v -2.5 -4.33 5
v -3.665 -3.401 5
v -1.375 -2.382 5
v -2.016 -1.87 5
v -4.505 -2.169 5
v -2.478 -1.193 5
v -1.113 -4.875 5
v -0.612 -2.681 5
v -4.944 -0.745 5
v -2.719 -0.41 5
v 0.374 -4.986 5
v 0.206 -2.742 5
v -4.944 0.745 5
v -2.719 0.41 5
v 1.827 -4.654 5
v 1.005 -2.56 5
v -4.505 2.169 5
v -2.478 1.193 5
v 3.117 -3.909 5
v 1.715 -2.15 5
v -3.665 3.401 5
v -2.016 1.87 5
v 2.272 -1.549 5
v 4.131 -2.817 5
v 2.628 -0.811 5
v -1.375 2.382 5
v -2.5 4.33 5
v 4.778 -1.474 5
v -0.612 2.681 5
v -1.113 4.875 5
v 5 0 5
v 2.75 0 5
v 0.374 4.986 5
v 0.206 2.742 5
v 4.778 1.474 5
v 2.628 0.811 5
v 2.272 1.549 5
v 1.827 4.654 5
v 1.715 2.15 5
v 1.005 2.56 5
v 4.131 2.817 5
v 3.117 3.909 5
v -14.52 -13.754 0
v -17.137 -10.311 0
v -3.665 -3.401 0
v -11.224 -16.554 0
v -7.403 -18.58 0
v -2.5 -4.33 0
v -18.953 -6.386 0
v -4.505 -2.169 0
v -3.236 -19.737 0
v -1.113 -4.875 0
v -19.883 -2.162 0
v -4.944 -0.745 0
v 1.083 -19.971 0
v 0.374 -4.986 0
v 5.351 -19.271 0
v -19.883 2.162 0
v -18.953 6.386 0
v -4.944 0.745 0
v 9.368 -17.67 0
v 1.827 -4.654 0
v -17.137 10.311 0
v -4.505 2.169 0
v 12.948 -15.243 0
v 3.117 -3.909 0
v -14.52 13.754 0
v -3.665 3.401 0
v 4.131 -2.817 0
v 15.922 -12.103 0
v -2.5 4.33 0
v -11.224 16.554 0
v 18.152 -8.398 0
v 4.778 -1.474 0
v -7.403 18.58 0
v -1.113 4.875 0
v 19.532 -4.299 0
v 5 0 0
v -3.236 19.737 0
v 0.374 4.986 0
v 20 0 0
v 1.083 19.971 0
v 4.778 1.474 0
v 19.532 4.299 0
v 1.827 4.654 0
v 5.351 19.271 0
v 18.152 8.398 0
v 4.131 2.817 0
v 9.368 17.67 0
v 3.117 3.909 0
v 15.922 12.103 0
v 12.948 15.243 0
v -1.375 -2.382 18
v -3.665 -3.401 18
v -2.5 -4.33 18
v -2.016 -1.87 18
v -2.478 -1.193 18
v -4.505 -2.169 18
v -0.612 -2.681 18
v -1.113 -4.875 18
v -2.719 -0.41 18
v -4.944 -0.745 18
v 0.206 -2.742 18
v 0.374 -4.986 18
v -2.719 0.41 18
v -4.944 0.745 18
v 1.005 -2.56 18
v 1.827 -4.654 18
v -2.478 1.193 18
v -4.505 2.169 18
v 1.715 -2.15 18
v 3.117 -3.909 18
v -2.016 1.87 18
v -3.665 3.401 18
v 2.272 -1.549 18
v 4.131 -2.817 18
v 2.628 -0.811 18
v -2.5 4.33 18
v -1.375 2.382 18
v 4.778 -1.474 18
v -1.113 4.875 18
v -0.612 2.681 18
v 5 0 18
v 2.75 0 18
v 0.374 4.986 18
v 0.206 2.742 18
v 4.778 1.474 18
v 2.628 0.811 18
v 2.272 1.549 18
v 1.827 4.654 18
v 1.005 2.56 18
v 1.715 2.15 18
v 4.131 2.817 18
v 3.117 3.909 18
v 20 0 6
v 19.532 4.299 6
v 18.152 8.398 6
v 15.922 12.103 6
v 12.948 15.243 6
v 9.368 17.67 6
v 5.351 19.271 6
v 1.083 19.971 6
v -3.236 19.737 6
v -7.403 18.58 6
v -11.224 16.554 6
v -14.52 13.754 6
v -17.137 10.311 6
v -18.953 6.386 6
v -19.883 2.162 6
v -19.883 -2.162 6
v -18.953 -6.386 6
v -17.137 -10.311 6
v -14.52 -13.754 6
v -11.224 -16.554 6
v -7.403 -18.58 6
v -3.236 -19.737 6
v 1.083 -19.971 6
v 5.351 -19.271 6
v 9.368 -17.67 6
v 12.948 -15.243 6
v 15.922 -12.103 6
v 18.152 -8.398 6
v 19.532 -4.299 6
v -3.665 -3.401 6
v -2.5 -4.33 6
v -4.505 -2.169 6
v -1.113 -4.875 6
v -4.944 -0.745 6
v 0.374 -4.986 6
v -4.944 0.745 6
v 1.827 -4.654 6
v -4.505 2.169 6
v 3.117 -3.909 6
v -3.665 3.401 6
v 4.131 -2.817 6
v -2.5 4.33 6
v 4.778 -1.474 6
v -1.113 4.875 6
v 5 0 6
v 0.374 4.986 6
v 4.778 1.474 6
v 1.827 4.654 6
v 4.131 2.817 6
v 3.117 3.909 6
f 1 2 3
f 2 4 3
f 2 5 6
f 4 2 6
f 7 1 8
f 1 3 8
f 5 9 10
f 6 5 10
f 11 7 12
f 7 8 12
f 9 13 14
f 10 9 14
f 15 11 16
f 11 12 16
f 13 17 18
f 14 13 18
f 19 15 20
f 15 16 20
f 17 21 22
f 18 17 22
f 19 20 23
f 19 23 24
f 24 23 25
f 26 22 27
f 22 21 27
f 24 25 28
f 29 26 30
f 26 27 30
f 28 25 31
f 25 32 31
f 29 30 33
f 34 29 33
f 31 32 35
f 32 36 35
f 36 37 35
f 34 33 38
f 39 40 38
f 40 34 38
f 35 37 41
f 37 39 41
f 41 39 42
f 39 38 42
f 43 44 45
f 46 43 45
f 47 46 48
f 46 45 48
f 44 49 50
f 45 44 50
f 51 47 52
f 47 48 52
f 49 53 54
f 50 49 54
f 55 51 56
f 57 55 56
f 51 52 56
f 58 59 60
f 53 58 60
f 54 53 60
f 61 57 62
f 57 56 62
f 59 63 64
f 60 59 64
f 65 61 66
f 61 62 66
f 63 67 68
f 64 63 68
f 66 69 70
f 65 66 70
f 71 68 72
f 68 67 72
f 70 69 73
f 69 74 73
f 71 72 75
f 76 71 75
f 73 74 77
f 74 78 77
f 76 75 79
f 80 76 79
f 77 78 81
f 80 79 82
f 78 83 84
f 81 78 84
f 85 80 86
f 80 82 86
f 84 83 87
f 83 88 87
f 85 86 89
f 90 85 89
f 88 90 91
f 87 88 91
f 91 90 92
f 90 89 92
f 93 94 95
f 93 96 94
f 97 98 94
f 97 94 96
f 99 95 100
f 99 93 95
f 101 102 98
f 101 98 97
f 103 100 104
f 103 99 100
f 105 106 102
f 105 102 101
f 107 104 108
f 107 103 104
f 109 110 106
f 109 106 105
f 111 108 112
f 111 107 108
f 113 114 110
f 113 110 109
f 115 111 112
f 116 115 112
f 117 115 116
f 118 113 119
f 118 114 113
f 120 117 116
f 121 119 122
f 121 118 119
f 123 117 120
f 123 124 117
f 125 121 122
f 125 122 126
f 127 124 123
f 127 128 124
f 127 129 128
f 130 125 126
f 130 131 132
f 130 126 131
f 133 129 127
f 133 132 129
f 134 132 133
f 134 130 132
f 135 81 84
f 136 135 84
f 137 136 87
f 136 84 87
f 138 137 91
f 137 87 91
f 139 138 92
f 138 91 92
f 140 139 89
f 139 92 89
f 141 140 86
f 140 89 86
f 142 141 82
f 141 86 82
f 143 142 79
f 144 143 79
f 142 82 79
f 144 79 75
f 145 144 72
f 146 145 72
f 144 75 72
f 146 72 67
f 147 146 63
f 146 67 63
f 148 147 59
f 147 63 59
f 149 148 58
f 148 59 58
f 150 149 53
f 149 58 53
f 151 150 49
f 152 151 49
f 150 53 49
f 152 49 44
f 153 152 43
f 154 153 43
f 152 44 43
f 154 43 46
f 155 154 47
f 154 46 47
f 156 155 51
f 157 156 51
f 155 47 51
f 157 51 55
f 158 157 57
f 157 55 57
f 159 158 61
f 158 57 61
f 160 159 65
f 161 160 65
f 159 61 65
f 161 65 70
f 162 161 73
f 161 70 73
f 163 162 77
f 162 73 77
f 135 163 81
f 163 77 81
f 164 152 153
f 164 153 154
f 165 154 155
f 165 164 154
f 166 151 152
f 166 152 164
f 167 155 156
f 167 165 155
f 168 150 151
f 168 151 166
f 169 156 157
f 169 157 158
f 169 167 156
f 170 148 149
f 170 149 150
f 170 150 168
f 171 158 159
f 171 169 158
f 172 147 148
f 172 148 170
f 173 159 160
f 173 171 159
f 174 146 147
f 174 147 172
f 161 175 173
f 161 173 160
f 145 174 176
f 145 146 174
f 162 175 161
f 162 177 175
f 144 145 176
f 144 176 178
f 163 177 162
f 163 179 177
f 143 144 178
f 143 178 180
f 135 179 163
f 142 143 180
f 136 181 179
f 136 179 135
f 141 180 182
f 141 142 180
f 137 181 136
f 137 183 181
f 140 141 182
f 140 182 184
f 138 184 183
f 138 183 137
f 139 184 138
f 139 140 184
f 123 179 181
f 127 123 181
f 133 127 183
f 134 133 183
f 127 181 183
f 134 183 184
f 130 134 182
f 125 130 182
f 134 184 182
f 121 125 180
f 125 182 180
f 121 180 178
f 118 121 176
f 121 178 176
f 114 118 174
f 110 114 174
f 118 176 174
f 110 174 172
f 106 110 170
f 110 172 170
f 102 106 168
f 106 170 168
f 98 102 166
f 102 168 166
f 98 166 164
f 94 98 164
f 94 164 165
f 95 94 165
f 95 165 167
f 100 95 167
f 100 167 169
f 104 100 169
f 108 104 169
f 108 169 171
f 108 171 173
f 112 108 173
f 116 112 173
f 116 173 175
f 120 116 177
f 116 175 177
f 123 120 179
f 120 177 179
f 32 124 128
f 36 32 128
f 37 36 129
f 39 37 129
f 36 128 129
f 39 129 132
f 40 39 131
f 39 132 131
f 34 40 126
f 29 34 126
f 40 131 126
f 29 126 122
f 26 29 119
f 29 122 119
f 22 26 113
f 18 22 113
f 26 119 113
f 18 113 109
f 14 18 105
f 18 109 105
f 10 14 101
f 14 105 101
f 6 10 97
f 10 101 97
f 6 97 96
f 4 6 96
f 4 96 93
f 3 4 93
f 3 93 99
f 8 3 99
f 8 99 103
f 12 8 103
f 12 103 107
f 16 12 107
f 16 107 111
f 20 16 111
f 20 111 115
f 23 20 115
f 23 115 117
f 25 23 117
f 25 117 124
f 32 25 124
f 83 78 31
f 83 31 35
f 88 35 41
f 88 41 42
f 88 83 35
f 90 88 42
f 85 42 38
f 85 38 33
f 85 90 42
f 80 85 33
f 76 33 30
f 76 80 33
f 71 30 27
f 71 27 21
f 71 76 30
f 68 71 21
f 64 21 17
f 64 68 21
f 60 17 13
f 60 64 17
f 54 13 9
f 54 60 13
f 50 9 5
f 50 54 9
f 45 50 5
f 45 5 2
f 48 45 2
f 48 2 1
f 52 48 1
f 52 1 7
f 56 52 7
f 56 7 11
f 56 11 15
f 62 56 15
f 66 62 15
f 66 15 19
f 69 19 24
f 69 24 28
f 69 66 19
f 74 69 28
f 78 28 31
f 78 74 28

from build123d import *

# Parameters (mm, degrees)
F0_R     = 20
F1_DEPTH = 6
F2_R     = 5
F3_DEPTH = 12
F4_R     = 2.75
F5_DEPTH = 18.001
F6_R     = 5
F7_DEPTH = 5


with BuildPart() as f1:
    # F0 (on Top) → F1 (new body)
    with BuildSketch(Plane.XY):
        Circle(F0_R)
    extrude(amount=F1_DEPTH)

    # F2 (on face) → F3 (join)
    with BuildSketch(Plane.XY.offset(6)):
        Circle(F2_R)
    extrude(amount=F3_DEPTH)

    # F4 (on face) → F5 (cut, through all)
    with BuildSketch(Plane.XY.offset(18)):
        Circle(F4_R)
    extrude(amount=-F5_DEPTH, mode=Mode.SUBTRACT)

    # F6 (on face) → F7 (cut)
    with BuildSketch(Plane.XY):
        Circle(F6_R)
    extrude(amount=F7_DEPTH, mode=Mode.SUBTRACT)


solid = f1.part
